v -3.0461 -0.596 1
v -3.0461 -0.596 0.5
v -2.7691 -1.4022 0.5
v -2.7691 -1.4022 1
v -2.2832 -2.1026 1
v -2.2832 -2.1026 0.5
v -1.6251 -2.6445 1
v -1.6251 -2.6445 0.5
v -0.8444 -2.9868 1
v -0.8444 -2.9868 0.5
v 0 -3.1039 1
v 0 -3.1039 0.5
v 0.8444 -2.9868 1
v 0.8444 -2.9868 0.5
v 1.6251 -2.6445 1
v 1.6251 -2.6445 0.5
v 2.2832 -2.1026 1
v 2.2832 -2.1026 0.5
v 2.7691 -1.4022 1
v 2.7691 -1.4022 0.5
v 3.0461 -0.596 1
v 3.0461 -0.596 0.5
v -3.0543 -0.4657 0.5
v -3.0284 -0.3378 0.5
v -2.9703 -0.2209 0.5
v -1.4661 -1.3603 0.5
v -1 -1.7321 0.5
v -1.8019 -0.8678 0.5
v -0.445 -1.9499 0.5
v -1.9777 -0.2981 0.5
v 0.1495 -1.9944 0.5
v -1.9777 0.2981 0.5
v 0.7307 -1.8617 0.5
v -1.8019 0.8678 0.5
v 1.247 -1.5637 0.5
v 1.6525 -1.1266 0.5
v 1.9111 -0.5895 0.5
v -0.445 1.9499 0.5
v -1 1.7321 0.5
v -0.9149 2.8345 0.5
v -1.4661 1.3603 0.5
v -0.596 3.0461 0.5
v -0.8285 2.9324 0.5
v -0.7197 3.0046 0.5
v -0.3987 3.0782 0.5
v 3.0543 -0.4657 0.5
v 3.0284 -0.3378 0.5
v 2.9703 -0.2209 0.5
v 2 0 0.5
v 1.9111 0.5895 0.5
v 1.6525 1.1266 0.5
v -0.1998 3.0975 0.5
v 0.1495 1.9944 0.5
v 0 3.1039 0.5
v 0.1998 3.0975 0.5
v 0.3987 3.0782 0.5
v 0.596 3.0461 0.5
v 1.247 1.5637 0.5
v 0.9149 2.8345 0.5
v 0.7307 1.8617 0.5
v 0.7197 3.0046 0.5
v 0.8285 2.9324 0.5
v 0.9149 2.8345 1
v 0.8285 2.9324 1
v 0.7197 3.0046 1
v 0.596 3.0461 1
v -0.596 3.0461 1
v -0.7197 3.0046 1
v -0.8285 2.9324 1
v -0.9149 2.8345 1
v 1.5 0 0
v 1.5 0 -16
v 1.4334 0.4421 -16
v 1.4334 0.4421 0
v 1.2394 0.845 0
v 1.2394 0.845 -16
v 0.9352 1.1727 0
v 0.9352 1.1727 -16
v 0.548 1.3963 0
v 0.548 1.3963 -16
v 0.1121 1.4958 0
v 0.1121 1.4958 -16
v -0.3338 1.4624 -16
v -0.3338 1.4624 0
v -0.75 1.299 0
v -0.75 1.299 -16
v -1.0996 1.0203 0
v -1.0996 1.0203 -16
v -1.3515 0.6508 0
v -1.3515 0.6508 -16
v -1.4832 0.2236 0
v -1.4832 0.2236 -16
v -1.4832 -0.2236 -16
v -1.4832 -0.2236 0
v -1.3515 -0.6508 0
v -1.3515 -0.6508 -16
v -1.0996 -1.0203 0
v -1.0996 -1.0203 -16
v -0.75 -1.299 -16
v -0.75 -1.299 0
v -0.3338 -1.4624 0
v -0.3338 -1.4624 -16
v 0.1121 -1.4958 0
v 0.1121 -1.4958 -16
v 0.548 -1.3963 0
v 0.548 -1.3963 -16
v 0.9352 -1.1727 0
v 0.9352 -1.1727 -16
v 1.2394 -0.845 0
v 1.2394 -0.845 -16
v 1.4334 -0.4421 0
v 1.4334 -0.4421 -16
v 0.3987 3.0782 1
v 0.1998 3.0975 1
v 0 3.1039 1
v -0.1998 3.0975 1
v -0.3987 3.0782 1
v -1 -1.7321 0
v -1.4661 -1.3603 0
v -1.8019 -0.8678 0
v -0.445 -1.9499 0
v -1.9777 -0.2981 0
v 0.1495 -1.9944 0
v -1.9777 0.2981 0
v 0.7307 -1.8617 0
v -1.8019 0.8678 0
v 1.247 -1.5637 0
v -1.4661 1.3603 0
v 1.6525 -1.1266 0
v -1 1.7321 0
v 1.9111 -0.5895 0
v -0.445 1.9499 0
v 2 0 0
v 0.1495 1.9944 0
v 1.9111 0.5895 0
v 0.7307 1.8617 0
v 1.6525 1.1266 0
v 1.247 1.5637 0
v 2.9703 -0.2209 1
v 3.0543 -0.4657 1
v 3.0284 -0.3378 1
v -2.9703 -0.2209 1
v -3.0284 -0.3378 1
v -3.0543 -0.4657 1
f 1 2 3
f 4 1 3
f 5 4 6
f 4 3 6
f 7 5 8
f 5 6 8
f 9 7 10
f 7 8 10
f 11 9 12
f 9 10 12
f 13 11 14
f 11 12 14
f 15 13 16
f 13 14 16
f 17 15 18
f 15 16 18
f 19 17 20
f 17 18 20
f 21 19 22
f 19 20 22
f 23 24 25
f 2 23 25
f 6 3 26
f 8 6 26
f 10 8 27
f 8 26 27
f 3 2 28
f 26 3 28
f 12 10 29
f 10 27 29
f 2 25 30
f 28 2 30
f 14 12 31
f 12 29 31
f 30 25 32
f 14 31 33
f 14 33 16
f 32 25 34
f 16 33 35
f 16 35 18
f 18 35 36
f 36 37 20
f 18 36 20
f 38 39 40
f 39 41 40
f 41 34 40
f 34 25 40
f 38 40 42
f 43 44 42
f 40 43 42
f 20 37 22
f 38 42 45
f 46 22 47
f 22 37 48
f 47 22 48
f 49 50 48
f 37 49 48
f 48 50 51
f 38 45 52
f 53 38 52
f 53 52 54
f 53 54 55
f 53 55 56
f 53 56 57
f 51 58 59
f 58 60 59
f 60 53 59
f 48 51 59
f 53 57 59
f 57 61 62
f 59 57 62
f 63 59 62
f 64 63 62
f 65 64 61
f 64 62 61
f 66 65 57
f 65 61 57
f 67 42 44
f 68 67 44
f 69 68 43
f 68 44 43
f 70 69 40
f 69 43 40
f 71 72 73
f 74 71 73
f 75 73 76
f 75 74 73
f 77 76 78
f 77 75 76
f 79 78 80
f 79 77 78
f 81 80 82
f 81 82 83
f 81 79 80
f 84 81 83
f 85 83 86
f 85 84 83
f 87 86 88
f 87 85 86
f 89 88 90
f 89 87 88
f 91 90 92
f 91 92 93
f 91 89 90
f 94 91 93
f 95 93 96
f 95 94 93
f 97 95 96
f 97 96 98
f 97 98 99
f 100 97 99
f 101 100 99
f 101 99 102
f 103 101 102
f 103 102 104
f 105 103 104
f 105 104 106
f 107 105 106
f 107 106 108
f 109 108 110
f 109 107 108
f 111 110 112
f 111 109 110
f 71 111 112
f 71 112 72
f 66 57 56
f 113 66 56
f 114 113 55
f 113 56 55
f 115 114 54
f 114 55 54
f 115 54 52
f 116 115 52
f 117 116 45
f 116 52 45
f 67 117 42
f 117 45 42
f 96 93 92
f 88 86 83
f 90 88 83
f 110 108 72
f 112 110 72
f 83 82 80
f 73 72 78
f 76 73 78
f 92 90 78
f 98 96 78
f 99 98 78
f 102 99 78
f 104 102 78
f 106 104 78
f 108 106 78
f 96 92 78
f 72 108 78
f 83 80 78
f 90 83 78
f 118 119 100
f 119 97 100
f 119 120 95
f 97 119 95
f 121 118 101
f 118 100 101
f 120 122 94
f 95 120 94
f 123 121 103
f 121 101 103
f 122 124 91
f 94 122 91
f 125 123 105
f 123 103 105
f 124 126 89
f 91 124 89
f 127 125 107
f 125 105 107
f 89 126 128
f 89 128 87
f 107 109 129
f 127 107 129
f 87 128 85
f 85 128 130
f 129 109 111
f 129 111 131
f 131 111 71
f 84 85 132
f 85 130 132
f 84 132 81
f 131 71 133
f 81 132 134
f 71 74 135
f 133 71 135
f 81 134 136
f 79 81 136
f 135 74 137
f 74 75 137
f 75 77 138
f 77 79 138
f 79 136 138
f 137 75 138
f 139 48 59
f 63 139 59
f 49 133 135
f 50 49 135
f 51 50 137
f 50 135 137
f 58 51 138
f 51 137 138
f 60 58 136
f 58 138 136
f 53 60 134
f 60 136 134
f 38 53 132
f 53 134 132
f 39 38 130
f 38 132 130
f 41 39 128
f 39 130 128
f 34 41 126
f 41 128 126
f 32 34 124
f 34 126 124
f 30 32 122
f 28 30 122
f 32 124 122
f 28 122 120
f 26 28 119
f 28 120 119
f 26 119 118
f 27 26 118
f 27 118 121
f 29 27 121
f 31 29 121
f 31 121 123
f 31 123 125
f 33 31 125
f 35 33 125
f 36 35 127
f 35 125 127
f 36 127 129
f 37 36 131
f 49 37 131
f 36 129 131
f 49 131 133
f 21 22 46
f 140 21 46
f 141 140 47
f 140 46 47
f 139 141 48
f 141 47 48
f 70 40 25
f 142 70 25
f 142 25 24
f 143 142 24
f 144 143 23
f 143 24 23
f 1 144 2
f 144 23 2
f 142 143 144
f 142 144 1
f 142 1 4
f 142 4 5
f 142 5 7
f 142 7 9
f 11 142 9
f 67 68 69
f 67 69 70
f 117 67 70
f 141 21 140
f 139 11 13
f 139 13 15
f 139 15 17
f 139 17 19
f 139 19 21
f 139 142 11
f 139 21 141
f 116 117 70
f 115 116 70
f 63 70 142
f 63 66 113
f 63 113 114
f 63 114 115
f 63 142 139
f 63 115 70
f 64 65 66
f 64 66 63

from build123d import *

# Parameters (mm, degrees)
SKETCH_1_R      = 1.5
EXTRUDE_1_DEPTH = 16
SKETCH_2_R      = 2
EXTRUDE_2_DEPTH = 0.5
EXTRUDE_3_DEPTH = 0.5


with BuildPart() as part:
    # 草圖1 → 填料-伸長1 (new body)
    with BuildSketch(Plane.XY):
        Circle(SKETCH_1_R)
    extrude(amount=-EXTRUDE_1_DEPTH)

    # 草圖2 → 填料-伸長2 (add)
    with BuildSketch(Plane.XY):
        Circle(SKETCH_2_R)
    extrude(amount=EXTRUDE_2_DEPTH)

    # 草圖3 → 填料-伸長3 (add)
    with BuildSketch(Plane.XY.offset(0.5)):
        with BuildLine():
            Line((-0.91486326, 2.834533474), (-2.970311666, -0.220914932))
            ThreePointArc((-2.970311666, -0.220914932), (-3.045533313, -0.400920314), (-3.046143975, -0.59600968))
            ThreePointArc((-3.046143975, -0.59600968), (0, -3.103904099), (3.046143975, -0.59600968))
            ThreePointArc((3.046143975, -0.59600968), (3.045533313, -0.400920314), (2.970311666, -0.220914932))
            Line((2.970311666, -0.220914932), (0.91486326, 2.834533474))
            ThreePointArc((0.91486326, 2.834533474), (0.776482443, 2.972050685), (0.59600968, 3.046143975))
            ThreePointArc((0.59600968, 3.046143975), (0.299400973, 3.089430321), (0, 3.103904099))
            ThreePointArc((0, 3.103904099), (-0.299400973, 3.089430321), (-0.59600968, 3.046143975))
            ThreePointArc((-0.59600968, 3.046143975), (-0.776482443, 2.972050685), (-0.91486326, 2.834533474))
        make_face()
    extrude(amount=EXTRUDE_3_DEPTH)


solid = part.part
